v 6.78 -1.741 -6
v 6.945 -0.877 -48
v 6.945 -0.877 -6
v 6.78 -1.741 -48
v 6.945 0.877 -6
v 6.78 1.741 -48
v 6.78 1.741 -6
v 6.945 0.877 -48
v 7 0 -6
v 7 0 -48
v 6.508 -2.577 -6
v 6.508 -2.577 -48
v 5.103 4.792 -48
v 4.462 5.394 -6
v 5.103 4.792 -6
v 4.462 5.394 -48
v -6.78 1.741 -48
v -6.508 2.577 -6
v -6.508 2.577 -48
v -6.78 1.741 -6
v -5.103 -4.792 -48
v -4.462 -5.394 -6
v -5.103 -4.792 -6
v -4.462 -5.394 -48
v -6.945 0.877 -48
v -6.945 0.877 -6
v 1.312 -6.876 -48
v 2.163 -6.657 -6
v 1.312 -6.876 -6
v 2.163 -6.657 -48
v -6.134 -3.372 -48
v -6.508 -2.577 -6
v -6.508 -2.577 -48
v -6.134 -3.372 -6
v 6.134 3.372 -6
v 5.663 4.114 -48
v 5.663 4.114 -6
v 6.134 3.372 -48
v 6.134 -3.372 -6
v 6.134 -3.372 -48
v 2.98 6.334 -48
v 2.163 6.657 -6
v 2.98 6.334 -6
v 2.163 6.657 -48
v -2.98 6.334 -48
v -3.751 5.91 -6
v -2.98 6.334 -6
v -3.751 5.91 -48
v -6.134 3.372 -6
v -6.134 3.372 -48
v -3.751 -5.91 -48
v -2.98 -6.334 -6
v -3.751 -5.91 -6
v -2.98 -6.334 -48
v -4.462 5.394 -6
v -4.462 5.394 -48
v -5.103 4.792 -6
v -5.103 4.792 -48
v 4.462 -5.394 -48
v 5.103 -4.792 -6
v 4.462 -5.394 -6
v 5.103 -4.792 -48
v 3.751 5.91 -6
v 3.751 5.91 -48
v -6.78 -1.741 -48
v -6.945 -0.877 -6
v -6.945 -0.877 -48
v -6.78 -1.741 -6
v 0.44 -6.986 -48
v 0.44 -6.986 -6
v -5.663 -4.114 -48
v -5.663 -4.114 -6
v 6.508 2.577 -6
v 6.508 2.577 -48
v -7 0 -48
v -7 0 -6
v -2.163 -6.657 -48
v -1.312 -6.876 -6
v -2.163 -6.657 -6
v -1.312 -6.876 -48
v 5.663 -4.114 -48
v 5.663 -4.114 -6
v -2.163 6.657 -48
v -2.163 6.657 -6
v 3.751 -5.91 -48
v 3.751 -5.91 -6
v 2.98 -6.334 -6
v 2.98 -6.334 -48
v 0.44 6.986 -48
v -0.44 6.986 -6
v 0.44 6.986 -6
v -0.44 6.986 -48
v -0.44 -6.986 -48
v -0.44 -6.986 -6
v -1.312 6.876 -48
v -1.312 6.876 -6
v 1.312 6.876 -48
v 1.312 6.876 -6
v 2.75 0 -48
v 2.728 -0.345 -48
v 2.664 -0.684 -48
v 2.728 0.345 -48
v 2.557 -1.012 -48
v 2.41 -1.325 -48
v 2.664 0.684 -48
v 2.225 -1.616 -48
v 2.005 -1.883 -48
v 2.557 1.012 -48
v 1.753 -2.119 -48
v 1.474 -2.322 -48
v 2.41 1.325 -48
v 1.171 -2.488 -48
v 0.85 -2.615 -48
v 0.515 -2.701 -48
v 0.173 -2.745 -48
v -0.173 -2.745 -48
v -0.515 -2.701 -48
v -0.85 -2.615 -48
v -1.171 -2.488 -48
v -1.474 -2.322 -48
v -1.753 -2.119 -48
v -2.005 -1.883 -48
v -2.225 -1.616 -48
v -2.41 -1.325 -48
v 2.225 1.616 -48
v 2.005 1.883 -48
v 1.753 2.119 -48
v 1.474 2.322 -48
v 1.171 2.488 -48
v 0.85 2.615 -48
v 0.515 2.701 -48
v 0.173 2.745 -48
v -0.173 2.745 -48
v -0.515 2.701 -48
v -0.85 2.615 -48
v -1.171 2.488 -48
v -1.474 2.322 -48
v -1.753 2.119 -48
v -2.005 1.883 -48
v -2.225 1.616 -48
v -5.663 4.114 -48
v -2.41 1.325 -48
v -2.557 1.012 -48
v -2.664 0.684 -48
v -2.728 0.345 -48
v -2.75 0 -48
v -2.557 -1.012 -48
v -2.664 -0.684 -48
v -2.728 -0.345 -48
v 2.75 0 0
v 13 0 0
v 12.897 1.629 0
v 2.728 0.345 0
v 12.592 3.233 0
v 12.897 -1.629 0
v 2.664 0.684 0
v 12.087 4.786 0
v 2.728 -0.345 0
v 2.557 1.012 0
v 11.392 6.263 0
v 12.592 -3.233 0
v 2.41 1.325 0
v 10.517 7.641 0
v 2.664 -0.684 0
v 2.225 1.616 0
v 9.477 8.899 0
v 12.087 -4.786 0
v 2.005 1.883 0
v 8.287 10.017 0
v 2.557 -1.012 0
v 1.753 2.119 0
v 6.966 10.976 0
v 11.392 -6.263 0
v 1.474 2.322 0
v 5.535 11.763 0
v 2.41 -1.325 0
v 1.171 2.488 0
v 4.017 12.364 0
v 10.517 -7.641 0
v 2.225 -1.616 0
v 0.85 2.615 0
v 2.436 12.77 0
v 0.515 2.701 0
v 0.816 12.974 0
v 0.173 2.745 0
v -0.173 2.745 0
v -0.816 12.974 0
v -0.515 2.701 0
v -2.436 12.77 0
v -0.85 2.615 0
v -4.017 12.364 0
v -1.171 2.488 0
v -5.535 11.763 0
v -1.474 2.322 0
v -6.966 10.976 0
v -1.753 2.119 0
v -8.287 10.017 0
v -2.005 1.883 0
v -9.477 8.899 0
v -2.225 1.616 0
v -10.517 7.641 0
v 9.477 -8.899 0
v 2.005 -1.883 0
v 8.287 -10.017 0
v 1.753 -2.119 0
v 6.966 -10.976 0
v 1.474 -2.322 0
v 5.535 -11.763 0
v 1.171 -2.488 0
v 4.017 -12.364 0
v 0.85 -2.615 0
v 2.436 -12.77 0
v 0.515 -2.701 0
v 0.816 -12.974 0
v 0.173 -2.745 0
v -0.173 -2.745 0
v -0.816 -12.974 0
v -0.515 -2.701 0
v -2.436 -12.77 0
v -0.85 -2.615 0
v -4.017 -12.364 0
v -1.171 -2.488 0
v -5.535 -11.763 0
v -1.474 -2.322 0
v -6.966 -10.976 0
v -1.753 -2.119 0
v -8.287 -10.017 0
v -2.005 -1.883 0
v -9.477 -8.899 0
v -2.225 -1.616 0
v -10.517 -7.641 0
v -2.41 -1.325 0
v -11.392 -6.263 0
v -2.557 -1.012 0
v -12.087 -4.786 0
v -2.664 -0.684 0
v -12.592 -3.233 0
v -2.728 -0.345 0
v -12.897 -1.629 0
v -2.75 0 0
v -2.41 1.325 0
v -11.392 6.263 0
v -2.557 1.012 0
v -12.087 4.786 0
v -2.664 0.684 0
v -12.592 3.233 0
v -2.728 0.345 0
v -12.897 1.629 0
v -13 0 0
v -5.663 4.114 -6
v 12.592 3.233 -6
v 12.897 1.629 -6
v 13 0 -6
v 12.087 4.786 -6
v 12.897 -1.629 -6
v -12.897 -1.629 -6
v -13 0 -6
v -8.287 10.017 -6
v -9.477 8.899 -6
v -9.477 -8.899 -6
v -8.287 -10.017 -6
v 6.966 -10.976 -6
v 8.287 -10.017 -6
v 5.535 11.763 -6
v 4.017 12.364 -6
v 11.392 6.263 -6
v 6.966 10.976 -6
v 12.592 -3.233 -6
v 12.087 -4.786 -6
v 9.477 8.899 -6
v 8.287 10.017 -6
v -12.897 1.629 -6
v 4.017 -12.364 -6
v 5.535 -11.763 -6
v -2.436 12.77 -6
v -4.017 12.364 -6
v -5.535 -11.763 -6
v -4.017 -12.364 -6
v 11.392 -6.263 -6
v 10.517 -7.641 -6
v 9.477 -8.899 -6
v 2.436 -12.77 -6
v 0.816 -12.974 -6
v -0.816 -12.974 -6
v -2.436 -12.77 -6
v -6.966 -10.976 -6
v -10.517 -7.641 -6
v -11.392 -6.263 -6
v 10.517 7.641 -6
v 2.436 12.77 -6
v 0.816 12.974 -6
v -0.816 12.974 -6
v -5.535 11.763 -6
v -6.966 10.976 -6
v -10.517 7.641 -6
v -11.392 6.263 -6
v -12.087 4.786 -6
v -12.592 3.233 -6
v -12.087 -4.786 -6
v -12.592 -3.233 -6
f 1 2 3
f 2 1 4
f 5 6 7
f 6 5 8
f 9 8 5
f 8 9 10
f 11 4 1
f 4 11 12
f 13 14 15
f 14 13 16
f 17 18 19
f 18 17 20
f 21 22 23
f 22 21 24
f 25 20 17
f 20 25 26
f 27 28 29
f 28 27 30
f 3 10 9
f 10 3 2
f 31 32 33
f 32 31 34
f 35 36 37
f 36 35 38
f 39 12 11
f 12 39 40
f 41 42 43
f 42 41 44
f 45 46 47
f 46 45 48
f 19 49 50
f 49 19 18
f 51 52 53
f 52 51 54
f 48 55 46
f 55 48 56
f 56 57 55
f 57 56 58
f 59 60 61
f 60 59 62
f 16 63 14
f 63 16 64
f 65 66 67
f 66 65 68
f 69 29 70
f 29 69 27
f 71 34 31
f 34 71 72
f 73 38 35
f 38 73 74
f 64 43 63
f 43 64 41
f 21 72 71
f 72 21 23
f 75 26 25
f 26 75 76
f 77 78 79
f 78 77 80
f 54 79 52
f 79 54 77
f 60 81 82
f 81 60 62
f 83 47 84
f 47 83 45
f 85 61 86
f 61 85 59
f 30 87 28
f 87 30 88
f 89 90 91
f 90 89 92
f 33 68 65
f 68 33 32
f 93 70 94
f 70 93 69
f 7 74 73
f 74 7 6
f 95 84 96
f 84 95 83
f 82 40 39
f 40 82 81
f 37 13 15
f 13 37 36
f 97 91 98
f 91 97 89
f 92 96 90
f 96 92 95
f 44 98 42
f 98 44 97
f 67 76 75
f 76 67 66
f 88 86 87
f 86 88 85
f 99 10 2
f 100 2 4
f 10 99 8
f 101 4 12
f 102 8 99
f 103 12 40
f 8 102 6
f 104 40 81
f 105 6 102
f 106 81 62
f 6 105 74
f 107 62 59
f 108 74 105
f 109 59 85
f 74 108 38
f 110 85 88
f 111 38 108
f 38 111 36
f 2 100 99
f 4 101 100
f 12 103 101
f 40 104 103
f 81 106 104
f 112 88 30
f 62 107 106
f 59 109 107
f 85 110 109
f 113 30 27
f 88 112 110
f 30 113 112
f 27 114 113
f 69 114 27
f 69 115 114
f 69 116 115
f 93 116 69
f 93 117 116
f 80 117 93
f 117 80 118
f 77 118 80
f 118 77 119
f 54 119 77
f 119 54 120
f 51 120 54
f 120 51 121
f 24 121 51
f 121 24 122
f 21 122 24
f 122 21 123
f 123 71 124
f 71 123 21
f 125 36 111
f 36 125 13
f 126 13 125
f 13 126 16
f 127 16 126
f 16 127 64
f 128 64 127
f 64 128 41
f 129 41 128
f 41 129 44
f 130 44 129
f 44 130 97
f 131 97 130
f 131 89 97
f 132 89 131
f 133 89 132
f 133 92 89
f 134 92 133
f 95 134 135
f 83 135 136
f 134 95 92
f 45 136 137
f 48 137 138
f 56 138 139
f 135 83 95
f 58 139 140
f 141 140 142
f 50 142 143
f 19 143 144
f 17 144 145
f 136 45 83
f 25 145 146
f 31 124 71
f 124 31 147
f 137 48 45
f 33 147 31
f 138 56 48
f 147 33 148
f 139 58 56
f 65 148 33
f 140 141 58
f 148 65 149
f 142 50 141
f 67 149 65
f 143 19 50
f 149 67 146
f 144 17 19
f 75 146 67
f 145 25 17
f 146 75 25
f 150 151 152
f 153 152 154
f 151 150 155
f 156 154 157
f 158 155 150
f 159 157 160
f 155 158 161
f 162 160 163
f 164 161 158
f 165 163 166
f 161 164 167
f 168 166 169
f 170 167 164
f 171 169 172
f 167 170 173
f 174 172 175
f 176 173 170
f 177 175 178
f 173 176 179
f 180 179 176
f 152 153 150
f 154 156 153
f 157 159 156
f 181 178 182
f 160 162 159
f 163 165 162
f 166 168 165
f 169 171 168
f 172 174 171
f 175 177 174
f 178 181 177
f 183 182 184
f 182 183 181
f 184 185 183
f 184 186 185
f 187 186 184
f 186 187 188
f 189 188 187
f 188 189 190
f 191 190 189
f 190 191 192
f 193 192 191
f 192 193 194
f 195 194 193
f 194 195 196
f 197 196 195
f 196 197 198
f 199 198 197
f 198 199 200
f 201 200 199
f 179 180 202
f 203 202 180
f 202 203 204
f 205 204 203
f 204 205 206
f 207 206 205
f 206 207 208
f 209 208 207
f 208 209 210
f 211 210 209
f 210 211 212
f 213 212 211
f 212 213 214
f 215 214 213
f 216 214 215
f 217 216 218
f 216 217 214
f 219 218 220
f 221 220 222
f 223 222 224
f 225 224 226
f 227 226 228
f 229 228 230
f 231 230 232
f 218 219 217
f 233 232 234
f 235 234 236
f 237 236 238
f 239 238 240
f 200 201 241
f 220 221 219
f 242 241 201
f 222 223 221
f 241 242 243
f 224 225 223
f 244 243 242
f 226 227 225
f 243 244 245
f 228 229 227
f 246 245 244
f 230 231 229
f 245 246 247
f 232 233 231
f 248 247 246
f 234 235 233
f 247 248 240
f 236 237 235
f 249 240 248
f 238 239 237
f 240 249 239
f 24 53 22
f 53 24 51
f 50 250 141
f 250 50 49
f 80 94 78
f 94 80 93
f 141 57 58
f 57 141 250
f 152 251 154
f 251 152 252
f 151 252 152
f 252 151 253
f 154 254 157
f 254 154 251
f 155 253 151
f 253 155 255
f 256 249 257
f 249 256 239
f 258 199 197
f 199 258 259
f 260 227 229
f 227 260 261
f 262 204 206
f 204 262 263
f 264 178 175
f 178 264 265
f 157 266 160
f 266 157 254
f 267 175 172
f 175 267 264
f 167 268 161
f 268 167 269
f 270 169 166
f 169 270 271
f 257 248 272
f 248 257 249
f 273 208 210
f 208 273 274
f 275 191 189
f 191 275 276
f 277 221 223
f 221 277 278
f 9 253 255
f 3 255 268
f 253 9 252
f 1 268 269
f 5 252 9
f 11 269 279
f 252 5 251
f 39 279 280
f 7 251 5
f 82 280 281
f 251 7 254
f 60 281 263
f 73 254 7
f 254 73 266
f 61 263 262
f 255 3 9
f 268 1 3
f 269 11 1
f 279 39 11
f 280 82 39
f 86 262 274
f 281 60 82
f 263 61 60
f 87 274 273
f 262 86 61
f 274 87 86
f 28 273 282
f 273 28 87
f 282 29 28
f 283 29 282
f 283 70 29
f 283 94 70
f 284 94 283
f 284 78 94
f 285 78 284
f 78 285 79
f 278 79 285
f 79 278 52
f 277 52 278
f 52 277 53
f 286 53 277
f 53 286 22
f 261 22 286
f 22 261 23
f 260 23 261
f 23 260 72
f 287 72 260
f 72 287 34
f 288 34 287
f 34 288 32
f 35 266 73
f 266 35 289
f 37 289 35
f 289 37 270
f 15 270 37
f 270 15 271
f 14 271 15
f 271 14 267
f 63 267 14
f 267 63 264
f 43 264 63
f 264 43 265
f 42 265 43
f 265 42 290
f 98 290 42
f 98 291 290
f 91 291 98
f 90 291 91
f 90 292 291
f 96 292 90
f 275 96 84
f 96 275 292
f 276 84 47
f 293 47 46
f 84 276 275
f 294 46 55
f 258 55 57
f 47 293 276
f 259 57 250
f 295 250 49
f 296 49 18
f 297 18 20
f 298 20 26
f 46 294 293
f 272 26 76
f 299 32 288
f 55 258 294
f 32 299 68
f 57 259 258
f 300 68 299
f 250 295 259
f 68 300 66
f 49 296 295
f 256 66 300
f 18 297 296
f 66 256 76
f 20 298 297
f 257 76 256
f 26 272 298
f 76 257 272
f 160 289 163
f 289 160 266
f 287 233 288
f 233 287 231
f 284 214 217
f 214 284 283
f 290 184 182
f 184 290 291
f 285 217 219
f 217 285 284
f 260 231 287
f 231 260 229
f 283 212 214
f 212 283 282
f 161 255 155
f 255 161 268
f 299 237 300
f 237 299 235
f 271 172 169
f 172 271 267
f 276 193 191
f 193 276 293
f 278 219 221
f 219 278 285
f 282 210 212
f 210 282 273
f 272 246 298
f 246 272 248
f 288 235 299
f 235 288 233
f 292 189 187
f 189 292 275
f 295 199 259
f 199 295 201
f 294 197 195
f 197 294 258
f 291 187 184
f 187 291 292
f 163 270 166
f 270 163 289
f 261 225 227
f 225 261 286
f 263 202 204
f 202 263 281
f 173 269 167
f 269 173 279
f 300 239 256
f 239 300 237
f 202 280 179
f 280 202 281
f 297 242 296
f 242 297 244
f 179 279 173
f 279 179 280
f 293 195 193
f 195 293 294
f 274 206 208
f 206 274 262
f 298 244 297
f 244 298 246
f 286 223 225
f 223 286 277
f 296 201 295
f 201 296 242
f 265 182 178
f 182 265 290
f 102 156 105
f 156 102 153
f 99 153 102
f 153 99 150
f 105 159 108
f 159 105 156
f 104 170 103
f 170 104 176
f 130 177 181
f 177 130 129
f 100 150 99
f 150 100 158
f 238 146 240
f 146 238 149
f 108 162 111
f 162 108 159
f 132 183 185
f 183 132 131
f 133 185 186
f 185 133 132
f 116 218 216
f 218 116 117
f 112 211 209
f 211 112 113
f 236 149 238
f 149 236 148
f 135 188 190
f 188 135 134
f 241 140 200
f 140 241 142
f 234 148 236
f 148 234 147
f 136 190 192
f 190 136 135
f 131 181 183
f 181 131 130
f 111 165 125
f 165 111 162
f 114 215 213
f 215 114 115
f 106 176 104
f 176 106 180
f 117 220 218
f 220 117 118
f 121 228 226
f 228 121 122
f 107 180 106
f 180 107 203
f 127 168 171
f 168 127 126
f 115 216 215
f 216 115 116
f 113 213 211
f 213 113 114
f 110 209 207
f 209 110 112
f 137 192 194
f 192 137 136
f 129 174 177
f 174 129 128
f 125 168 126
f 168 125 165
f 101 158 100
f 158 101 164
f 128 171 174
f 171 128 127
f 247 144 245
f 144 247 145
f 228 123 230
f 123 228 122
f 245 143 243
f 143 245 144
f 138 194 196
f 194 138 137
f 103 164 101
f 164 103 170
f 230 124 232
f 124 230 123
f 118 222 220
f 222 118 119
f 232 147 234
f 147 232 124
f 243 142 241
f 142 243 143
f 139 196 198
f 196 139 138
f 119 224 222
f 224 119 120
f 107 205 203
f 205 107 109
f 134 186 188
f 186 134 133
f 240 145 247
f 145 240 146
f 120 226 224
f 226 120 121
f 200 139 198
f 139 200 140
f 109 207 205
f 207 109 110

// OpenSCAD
$fn = 50;


difference() {
	union() {
		translate(v = [0, 0, -48.0000000000]) {
			cylinder(h = 48, r = 7.0000000000);
		}
		translate(v = [0, 0, -6.0000000000]) {
			cylinder(h = 6, r = 13.0000000000);
		}
	}
	union() {
		#translate(v = [0, 0, -48]) {
			cylinder(h = 48, r = 2.7500000000);
		}
	}
}
